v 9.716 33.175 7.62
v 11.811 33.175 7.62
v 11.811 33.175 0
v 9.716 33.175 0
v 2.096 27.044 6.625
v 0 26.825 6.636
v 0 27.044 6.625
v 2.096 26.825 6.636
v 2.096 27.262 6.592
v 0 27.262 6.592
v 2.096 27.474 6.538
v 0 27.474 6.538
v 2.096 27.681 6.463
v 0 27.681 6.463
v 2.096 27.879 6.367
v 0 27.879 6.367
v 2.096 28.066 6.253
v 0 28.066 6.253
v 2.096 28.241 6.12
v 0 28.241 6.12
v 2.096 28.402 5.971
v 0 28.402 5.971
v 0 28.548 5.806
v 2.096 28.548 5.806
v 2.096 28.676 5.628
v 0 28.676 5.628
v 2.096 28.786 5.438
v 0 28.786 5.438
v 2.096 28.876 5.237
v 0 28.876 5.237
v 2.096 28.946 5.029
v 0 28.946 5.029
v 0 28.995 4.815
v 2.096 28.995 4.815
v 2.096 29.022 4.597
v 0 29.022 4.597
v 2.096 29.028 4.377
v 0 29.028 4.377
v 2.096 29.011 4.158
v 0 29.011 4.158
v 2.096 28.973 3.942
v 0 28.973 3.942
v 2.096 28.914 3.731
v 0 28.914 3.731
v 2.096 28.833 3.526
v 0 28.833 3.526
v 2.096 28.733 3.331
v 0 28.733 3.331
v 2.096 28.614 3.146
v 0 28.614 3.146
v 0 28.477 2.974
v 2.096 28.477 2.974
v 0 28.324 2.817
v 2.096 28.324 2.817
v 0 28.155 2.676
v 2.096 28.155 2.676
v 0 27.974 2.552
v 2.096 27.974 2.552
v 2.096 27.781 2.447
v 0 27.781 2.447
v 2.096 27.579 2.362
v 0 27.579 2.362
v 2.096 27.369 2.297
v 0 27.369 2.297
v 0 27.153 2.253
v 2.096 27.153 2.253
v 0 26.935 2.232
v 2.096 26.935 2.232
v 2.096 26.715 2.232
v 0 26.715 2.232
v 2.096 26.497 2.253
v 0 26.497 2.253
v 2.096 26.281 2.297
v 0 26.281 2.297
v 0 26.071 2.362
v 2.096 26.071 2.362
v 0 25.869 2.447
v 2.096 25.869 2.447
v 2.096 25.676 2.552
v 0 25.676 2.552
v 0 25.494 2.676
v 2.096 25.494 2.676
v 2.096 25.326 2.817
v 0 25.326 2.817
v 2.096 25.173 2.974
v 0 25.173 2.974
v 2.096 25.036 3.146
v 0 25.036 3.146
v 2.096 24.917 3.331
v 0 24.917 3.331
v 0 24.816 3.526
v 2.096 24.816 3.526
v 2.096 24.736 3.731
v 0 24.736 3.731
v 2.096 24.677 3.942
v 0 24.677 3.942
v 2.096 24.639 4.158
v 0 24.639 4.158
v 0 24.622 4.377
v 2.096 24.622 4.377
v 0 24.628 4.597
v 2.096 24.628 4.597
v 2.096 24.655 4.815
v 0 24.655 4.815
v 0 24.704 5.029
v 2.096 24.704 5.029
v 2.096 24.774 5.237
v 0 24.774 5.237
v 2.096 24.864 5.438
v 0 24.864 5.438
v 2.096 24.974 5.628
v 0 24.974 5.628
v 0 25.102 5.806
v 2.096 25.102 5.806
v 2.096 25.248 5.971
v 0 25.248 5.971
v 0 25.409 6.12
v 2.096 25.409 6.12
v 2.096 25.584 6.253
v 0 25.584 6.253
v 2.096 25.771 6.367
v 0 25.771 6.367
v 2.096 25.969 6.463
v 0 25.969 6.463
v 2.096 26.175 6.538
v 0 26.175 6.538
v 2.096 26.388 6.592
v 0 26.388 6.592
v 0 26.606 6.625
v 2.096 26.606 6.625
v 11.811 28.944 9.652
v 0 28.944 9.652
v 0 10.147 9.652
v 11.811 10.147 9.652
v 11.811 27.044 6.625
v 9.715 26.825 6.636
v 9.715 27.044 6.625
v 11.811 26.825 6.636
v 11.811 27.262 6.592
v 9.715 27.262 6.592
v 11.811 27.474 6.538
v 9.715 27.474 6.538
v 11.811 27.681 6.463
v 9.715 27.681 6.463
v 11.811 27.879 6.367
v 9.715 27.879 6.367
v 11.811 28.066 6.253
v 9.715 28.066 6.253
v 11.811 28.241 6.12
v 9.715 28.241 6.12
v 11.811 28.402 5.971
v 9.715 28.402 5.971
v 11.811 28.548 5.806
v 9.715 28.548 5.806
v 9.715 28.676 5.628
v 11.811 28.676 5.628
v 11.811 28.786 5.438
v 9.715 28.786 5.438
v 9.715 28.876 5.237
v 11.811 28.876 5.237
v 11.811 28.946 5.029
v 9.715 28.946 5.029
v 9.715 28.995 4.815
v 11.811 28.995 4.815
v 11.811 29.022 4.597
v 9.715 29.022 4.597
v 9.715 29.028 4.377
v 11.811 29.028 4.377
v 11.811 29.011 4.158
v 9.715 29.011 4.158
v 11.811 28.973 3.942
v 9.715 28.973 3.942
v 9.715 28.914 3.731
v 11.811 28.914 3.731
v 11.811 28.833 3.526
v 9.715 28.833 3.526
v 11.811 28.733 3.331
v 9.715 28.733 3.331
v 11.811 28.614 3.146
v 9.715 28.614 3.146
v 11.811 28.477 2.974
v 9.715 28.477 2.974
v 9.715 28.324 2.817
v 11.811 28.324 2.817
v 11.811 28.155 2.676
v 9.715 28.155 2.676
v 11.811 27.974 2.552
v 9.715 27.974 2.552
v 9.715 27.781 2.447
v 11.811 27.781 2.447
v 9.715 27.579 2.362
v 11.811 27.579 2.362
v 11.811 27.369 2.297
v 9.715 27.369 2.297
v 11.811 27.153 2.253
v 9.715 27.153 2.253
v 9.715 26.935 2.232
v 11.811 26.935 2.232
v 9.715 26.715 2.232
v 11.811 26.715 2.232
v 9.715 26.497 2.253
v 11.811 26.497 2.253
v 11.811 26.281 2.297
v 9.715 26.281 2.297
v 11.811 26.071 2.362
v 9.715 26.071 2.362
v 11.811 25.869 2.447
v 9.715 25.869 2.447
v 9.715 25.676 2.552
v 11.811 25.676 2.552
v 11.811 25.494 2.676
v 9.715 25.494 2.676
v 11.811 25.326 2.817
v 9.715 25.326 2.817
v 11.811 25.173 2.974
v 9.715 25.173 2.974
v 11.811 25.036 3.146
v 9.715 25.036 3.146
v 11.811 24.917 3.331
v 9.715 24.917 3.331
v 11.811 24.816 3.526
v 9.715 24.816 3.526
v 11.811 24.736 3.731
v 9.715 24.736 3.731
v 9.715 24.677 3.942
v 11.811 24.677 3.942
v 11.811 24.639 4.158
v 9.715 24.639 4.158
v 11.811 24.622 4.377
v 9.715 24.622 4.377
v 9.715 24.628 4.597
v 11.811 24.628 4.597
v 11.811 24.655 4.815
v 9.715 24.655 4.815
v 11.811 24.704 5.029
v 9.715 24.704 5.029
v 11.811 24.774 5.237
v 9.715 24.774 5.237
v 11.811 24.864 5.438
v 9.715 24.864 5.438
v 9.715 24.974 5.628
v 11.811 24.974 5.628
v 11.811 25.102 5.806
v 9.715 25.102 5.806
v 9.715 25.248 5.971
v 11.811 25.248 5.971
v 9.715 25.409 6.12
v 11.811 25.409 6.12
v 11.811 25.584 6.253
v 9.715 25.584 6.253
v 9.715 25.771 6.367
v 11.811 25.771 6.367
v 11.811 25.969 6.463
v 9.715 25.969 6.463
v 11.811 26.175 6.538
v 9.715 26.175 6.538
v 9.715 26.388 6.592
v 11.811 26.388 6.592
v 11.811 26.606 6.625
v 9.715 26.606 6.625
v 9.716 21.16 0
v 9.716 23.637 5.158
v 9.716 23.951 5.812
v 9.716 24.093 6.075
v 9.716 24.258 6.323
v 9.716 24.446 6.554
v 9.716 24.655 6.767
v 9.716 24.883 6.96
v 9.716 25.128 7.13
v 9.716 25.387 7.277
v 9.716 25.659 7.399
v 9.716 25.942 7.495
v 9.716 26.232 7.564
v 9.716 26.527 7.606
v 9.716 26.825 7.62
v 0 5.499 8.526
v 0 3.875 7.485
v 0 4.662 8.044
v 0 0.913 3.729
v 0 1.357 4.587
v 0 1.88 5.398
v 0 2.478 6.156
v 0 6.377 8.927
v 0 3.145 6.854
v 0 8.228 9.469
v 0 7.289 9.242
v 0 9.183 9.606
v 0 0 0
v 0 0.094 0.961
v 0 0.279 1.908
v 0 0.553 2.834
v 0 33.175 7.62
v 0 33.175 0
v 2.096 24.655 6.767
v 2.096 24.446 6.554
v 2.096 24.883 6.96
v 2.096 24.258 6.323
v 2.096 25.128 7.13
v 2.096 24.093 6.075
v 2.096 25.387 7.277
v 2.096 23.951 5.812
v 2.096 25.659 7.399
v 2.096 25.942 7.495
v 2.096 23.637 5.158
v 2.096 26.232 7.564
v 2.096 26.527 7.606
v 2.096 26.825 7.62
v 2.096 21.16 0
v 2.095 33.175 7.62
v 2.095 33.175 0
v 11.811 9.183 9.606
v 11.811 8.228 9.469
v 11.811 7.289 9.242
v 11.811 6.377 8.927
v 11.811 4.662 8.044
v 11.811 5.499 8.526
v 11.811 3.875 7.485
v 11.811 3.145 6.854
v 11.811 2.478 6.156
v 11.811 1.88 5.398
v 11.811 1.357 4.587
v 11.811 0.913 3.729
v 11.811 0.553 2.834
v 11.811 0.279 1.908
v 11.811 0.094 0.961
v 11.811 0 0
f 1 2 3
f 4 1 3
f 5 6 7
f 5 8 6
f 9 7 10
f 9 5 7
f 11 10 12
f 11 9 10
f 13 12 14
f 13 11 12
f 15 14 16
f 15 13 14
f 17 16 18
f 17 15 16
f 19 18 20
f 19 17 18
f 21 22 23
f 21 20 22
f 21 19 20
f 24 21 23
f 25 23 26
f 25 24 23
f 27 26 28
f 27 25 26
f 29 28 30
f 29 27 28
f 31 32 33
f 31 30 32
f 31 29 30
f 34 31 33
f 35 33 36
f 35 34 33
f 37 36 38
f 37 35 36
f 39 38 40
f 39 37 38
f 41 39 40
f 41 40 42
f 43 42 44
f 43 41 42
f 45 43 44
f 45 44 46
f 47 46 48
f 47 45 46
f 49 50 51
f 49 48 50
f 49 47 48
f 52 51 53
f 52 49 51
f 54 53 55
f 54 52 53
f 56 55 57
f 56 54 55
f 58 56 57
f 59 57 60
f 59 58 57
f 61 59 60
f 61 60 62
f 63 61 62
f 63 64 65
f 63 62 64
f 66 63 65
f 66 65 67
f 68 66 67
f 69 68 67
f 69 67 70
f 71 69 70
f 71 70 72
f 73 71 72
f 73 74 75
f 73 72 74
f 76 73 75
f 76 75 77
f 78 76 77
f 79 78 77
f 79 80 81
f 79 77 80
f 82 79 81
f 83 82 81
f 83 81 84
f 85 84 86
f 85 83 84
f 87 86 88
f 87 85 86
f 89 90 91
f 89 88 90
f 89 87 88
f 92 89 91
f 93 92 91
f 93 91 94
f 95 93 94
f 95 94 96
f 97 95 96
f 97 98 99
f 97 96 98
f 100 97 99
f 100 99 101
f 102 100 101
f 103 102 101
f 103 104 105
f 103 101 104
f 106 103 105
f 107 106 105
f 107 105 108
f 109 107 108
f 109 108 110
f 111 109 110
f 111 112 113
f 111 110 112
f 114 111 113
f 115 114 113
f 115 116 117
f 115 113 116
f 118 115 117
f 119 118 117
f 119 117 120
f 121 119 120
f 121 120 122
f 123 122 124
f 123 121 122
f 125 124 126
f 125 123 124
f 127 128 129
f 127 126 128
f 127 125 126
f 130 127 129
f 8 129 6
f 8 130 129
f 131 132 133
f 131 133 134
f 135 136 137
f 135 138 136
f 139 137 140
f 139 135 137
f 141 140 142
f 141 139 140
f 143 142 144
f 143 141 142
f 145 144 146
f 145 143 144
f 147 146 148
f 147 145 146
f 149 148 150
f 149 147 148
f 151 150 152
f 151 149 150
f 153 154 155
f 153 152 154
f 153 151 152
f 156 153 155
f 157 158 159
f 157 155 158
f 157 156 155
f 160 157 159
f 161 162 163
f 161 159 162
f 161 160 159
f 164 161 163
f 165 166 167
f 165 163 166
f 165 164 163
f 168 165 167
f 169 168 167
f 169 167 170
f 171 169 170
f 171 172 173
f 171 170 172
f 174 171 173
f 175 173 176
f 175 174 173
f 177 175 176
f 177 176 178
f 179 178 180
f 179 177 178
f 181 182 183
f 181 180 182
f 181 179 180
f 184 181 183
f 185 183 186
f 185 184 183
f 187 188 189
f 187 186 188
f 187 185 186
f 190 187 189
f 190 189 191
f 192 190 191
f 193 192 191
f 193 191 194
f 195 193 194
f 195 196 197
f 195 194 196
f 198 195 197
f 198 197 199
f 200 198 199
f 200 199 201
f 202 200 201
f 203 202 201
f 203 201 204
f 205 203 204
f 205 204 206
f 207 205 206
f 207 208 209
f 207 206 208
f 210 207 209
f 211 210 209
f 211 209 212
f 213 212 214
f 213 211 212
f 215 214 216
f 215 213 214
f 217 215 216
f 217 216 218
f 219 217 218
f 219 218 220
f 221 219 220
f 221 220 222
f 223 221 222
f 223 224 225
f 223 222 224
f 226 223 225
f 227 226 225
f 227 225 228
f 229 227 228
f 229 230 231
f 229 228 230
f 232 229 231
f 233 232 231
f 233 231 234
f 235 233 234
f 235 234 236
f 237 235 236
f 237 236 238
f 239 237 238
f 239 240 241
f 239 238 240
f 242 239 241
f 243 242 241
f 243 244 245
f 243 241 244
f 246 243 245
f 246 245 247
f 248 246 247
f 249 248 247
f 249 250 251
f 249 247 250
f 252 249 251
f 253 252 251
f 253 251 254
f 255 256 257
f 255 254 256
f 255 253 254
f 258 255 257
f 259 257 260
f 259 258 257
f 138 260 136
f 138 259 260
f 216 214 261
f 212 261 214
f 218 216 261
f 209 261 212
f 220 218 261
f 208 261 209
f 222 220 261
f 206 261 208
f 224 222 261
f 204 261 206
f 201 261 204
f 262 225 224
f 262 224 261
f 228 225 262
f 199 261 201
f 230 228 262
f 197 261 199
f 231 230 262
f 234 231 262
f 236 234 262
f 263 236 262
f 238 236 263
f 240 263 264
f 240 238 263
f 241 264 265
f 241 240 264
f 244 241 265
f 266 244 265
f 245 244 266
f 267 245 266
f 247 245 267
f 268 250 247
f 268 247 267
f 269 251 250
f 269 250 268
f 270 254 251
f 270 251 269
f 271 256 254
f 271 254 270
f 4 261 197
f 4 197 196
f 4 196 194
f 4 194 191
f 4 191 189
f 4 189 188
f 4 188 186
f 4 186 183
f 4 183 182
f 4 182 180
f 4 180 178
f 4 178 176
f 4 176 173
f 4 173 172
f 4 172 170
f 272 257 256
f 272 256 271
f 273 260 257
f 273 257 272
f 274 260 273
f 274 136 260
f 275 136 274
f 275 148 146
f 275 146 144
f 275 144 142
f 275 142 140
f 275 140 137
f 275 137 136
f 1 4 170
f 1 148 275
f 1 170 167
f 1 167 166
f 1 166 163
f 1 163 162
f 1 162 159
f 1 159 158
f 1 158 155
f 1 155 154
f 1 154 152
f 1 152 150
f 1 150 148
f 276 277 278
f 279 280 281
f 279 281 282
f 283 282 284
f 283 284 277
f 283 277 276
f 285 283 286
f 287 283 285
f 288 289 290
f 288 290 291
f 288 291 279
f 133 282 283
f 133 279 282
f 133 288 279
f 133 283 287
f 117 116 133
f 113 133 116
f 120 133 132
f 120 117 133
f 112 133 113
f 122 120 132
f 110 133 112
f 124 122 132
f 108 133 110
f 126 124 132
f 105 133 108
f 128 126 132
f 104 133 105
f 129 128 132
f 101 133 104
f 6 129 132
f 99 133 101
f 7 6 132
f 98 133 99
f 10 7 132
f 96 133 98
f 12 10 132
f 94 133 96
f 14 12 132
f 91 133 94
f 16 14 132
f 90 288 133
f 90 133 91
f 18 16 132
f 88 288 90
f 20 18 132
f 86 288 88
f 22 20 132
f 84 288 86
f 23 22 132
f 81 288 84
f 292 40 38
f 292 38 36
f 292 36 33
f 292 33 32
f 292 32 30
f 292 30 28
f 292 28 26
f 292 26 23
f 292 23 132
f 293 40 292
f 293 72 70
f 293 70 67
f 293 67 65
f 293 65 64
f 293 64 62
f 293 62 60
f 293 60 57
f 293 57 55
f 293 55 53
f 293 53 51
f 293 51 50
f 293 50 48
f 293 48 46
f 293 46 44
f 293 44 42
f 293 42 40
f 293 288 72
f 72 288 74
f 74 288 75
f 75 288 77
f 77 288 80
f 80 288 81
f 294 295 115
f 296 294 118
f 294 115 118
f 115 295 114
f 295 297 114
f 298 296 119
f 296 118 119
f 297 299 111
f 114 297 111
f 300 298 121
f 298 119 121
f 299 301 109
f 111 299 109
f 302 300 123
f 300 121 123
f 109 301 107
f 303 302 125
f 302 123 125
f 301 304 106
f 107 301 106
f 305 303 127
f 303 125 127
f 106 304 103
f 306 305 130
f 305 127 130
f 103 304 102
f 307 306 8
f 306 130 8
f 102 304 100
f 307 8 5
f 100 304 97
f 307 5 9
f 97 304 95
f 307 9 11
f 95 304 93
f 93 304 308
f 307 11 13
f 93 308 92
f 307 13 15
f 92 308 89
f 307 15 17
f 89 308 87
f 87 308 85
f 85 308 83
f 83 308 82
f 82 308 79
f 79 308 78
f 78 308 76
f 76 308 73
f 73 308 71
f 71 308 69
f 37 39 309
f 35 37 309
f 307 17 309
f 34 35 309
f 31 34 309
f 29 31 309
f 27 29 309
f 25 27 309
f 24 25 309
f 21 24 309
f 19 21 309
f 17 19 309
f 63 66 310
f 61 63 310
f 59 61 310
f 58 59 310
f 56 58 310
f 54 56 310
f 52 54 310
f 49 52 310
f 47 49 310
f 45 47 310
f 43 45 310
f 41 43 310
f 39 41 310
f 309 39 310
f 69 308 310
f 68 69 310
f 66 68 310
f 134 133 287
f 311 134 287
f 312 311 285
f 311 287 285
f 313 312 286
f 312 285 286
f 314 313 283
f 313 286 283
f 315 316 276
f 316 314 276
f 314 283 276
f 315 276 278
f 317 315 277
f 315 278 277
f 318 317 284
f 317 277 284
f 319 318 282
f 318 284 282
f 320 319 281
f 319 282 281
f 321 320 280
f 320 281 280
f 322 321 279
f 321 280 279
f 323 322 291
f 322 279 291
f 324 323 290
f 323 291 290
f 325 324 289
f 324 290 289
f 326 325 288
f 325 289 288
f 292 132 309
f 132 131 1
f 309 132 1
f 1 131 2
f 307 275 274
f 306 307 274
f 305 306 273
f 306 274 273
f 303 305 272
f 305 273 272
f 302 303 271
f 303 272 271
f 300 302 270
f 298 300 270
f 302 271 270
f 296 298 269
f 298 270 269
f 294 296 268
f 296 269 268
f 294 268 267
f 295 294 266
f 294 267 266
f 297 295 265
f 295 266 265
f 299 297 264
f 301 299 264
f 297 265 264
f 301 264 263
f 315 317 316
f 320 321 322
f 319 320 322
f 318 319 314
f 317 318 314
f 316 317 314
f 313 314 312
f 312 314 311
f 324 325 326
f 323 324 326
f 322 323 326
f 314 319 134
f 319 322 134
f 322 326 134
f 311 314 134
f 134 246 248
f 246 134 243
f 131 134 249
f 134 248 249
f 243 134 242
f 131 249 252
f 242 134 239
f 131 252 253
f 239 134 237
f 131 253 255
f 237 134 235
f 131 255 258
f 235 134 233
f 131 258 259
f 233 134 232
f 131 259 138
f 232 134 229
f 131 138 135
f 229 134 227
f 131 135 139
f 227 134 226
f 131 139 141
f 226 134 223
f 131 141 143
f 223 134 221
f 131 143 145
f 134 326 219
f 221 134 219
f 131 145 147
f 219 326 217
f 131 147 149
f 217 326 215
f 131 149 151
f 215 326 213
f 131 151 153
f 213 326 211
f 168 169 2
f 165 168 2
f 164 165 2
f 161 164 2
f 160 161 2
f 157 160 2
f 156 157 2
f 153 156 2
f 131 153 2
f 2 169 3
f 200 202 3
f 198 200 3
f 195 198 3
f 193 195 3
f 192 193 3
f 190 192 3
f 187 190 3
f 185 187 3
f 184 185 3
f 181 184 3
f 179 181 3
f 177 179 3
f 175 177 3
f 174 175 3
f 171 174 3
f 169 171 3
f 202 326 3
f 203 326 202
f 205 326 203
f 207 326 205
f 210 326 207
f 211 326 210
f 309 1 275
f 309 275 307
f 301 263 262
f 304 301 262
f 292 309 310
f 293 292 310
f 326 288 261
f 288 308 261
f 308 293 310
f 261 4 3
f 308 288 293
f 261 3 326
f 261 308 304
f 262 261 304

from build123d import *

# Parameters (mm, degrees)
SKETCH1_W               = 11.811
SKETCH1_H               = 45.98924
BOSS_EXTRUDE1_DEPTH     = 9.652
FILLET5_R               = 4.826
SKETCH2_W               = 7.62
SKETCH2_H               = 22.352
CUT_EXTRUDE1_DEPTH      = 7.62
CUT_EXTRUDE2_DEPTH      = 49.452771033
CUT_EXTRUDE2_DEPTH_BACK = 49.452771033
SKETCH3_R               = 2.20345
FILLET4_R               = 4.826
FILLET6_R               = 10.16
CUT_EXTRUDE3_DEPTH      = 49.452771033
CUT_EXTRUDE4_DEPTH      = 7.62
BOSS_EXTRUDE2_DEPTH     = 7.62


with BuildPart() as part:
    # Sketch1 → Boss-Extrude1 (new body)
    with BuildSketch(Plane.XY):
        with Locations((5.9055, 22.99462)):
            Rectangle(SKETCH1_W, SKETCH1_H)
    extrude(amount=BOSS_EXTRUDE1_DEPTH)

    # Fillet5
    fillet5_edges = [part.edges().sort_by_distance(p)[0] for p in [
        (5.9055, 45.98924, 0),
    ]]
    fillet(fillet5_edges, radius=FILLET5_R)

    # Sketch2 → Cut-Extrude1 (cut)
    with BuildSketch(Plane(origin=(0, 0, 0), x_dir=(-1, 0, 0), z_dir=(0, 0, -1))):
        with Locations((-5.9055, 34.81324)):
            Rectangle(SKETCH2_W, SKETCH2_H)
    extrude(amount=-CUT_EXTRUDE1_DEPTH, mode=Mode.SUBTRACT)

    # Sketch3 → Cut-Extrude2 (cut, two sides: drawn at the far end of the back side and taken through both)
    with BuildSketch(Plane.ZY.offset(-CUT_EXTRUDE2_DEPTH_BACK)):
        with Locations((4.4323, 26.82494)):
            Circle(SKETCH3_R)
    extrude(amount=CUT_EXTRUDE2_DEPTH + CUT_EXTRUDE2_DEPTH_BACK, mode=Mode.SUBTRACT)

    # Fillet4
    # the kernel refuses this fillet: 4.826 mm, written as the material it takes off along each edge
    with BuildSketch(Plane(origin=(23.876, 45.98924, 9.652), x_dir=(0, 0, -1), z_dir=(-1, 0, 0))) as fillet4_piece_1:
        with BuildLine():
            CenterArc((FILLET4_R, FILLET4_R), FILLET4_R, 180, 90)
            Line((0, FILLET4_R), (0, 0))
            Line((0, 0), (FILLET4_R, 0))
        make_face()
    extrude(amount=35.941, mode=Mode.SUBTRACT)

    # Fillet6
    # the kernel refuses this fillet: 10.16 mm, written as the material it takes off along each edge
    with BuildSketch(Plane(origin=(-25.368230131, 0, 9.652), x_dir=(0, 1, 0), z_dir=(1, 0, 0))) as fillet6_piece_1:
        with BuildLine():
            CenterArc((10.147292053, -10.16), FILLET6_R, 90, 87.134016017)
            Line((0, -9.652), (-0.202945841, -9.64184))
            ThreePointArc((-0.202945841, -9.64184), (-0.2032, -4.826), (-0.2032, 0))
            Line((-0.2032, 0), (0, 0.2032))
            Line((0, 0.2032), (10.147292053, 0.2032))
            Line((10.147292053, 0.2032), (10.147292053, 0))
        make_face()
    extrude(amount=62.547460263, mode=Mode.SUBTRACT)

    # Sketch4 → Cut-Extrude3 (cut, through all)
    with BuildSketch(Plane(origin=(11.811, 0, 0), x_dir=(0, 0, -1), z_dir=(1, 0, 0))):
        Polygon((-9.652, 28.943813088), (-7.62, 33.17494), (0, 33.17494), (0, 45.98924), (-9.652, 45.98924), align=None)
    extrude(amount=-CUT_EXTRUDE3_DEPTH, mode=Mode.SUBTRACT)

    # Sketch5 → Cut-Extrude4 (cut)
    with BuildSketch(Plane.ZY.offset(-9.7155)):
        Polygon((0, 21.160076085), (5.158068358, 23.63724), (0, 23.63724), align=None)
    extrude(amount=CUT_EXTRUDE4_DEPTH, mode=Mode.SUBTRACT)

    # Sketch5<3> → Boss-Extrude2 (add)
    with BuildSketch(Plane.ZY.offset(-9.7155)):
        with BuildLine():
            Line((5.812301369, 23.951435604), (5.158068358, 23.63724))
            Line((5.158068358, 23.63724), (7.62, 23.63724))
            Line((7.62, 23.63724), (7.62, 26.82494))
            ThreePointArc((7.62, 26.82494), (7.130490287, 25.127530072), (5.812301369, 23.951435604))
        make_face()
    extrude(amount=BOSS_EXTRUDE2_DEPTH)


solid = part.part
